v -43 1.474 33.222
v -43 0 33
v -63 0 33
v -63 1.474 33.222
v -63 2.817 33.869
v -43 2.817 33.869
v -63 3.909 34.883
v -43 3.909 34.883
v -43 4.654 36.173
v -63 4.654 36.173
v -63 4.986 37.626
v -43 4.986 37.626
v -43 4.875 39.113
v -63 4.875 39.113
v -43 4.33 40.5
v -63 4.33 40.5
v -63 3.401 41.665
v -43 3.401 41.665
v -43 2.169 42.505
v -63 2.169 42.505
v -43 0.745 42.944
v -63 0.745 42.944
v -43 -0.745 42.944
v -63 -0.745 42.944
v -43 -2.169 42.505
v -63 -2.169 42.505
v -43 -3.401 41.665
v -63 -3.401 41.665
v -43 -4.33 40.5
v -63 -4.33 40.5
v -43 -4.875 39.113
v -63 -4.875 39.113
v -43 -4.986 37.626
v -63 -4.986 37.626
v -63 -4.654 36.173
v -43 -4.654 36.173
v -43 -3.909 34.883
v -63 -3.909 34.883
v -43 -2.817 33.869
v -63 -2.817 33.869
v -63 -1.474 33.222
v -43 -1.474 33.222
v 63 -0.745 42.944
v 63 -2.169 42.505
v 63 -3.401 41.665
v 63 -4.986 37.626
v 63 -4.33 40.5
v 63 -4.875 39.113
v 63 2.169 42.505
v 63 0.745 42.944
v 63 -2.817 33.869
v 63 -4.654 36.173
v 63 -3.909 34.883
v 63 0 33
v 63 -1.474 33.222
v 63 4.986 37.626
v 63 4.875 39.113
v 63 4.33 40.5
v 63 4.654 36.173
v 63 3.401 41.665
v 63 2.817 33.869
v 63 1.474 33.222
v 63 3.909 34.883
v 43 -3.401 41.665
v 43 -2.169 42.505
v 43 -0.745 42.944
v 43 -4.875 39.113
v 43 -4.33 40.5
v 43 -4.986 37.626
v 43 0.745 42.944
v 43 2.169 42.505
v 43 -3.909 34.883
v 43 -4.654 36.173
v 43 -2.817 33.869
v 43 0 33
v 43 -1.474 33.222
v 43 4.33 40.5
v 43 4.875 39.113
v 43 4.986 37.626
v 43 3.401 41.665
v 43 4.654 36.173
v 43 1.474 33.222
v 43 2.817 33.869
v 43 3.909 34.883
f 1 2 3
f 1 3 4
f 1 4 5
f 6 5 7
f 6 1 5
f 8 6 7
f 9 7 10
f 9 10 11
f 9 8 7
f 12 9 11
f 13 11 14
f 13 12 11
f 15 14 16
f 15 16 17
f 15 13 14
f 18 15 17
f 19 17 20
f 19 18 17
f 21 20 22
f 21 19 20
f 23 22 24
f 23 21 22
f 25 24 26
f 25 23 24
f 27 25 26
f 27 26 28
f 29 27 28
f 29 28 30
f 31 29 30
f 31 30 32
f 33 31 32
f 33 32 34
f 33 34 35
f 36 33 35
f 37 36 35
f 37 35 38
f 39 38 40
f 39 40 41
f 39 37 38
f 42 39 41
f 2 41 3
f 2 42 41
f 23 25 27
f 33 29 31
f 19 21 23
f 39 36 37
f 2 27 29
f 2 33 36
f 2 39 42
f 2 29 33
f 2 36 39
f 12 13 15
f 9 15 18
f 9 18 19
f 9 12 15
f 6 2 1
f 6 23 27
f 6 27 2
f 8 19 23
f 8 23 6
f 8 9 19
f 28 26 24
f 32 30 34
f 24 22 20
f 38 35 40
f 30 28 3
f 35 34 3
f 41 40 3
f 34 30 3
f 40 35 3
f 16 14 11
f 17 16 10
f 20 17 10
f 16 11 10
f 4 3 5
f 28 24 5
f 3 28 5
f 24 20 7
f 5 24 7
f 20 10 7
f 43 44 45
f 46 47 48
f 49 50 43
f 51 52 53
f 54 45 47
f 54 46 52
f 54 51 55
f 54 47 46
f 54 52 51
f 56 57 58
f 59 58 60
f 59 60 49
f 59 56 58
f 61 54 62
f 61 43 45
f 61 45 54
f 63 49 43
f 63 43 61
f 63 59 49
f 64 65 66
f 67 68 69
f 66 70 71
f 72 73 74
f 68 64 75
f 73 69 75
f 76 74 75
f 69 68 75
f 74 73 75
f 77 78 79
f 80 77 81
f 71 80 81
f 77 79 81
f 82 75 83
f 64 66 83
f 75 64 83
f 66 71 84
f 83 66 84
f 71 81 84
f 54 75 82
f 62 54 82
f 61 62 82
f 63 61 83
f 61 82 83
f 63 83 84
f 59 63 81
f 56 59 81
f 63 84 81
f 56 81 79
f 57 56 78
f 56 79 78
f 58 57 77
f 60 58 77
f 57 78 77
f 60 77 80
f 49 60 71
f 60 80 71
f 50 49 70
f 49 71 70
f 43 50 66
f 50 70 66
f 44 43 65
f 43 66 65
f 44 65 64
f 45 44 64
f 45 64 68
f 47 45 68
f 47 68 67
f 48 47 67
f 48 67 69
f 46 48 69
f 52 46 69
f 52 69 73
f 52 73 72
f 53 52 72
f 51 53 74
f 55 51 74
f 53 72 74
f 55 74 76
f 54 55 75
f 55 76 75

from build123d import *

# Parameters (mm, degrees)
CYLINDER004_R     = 5
CYLINDER004_DEPTH = 20


with BuildPart() as agujero_cables:
    # Cylinder004 → Cylinder004 (new body)
    with BuildSketch(Plane(origin=(43, 0, 38), x_dir=(0, 0, -1), z_dir=(1, 0, 0))):
        Circle(CYLINDER004_R)
    extrude(amount=CYLINDER004_DEPTH)


with BuildPart() as part_mirroring007:
    # Part__Mirroring007: instance of agujero-cables
    add(agujero_cables.part.mirror(Plane(origin=(0, 0, 0), x_dir=(0, -1, 0), z_dir=(1, 0, 0))))


with BuildPart() as agujeros_cables:
    # Fusion001030 base: copy of agujero-cables
    add(agujero_cables.part)

    # Fusion001030: union Part__Mirroring007
    add(part_mirroring007.part)


solid = agujeros_cables.part
